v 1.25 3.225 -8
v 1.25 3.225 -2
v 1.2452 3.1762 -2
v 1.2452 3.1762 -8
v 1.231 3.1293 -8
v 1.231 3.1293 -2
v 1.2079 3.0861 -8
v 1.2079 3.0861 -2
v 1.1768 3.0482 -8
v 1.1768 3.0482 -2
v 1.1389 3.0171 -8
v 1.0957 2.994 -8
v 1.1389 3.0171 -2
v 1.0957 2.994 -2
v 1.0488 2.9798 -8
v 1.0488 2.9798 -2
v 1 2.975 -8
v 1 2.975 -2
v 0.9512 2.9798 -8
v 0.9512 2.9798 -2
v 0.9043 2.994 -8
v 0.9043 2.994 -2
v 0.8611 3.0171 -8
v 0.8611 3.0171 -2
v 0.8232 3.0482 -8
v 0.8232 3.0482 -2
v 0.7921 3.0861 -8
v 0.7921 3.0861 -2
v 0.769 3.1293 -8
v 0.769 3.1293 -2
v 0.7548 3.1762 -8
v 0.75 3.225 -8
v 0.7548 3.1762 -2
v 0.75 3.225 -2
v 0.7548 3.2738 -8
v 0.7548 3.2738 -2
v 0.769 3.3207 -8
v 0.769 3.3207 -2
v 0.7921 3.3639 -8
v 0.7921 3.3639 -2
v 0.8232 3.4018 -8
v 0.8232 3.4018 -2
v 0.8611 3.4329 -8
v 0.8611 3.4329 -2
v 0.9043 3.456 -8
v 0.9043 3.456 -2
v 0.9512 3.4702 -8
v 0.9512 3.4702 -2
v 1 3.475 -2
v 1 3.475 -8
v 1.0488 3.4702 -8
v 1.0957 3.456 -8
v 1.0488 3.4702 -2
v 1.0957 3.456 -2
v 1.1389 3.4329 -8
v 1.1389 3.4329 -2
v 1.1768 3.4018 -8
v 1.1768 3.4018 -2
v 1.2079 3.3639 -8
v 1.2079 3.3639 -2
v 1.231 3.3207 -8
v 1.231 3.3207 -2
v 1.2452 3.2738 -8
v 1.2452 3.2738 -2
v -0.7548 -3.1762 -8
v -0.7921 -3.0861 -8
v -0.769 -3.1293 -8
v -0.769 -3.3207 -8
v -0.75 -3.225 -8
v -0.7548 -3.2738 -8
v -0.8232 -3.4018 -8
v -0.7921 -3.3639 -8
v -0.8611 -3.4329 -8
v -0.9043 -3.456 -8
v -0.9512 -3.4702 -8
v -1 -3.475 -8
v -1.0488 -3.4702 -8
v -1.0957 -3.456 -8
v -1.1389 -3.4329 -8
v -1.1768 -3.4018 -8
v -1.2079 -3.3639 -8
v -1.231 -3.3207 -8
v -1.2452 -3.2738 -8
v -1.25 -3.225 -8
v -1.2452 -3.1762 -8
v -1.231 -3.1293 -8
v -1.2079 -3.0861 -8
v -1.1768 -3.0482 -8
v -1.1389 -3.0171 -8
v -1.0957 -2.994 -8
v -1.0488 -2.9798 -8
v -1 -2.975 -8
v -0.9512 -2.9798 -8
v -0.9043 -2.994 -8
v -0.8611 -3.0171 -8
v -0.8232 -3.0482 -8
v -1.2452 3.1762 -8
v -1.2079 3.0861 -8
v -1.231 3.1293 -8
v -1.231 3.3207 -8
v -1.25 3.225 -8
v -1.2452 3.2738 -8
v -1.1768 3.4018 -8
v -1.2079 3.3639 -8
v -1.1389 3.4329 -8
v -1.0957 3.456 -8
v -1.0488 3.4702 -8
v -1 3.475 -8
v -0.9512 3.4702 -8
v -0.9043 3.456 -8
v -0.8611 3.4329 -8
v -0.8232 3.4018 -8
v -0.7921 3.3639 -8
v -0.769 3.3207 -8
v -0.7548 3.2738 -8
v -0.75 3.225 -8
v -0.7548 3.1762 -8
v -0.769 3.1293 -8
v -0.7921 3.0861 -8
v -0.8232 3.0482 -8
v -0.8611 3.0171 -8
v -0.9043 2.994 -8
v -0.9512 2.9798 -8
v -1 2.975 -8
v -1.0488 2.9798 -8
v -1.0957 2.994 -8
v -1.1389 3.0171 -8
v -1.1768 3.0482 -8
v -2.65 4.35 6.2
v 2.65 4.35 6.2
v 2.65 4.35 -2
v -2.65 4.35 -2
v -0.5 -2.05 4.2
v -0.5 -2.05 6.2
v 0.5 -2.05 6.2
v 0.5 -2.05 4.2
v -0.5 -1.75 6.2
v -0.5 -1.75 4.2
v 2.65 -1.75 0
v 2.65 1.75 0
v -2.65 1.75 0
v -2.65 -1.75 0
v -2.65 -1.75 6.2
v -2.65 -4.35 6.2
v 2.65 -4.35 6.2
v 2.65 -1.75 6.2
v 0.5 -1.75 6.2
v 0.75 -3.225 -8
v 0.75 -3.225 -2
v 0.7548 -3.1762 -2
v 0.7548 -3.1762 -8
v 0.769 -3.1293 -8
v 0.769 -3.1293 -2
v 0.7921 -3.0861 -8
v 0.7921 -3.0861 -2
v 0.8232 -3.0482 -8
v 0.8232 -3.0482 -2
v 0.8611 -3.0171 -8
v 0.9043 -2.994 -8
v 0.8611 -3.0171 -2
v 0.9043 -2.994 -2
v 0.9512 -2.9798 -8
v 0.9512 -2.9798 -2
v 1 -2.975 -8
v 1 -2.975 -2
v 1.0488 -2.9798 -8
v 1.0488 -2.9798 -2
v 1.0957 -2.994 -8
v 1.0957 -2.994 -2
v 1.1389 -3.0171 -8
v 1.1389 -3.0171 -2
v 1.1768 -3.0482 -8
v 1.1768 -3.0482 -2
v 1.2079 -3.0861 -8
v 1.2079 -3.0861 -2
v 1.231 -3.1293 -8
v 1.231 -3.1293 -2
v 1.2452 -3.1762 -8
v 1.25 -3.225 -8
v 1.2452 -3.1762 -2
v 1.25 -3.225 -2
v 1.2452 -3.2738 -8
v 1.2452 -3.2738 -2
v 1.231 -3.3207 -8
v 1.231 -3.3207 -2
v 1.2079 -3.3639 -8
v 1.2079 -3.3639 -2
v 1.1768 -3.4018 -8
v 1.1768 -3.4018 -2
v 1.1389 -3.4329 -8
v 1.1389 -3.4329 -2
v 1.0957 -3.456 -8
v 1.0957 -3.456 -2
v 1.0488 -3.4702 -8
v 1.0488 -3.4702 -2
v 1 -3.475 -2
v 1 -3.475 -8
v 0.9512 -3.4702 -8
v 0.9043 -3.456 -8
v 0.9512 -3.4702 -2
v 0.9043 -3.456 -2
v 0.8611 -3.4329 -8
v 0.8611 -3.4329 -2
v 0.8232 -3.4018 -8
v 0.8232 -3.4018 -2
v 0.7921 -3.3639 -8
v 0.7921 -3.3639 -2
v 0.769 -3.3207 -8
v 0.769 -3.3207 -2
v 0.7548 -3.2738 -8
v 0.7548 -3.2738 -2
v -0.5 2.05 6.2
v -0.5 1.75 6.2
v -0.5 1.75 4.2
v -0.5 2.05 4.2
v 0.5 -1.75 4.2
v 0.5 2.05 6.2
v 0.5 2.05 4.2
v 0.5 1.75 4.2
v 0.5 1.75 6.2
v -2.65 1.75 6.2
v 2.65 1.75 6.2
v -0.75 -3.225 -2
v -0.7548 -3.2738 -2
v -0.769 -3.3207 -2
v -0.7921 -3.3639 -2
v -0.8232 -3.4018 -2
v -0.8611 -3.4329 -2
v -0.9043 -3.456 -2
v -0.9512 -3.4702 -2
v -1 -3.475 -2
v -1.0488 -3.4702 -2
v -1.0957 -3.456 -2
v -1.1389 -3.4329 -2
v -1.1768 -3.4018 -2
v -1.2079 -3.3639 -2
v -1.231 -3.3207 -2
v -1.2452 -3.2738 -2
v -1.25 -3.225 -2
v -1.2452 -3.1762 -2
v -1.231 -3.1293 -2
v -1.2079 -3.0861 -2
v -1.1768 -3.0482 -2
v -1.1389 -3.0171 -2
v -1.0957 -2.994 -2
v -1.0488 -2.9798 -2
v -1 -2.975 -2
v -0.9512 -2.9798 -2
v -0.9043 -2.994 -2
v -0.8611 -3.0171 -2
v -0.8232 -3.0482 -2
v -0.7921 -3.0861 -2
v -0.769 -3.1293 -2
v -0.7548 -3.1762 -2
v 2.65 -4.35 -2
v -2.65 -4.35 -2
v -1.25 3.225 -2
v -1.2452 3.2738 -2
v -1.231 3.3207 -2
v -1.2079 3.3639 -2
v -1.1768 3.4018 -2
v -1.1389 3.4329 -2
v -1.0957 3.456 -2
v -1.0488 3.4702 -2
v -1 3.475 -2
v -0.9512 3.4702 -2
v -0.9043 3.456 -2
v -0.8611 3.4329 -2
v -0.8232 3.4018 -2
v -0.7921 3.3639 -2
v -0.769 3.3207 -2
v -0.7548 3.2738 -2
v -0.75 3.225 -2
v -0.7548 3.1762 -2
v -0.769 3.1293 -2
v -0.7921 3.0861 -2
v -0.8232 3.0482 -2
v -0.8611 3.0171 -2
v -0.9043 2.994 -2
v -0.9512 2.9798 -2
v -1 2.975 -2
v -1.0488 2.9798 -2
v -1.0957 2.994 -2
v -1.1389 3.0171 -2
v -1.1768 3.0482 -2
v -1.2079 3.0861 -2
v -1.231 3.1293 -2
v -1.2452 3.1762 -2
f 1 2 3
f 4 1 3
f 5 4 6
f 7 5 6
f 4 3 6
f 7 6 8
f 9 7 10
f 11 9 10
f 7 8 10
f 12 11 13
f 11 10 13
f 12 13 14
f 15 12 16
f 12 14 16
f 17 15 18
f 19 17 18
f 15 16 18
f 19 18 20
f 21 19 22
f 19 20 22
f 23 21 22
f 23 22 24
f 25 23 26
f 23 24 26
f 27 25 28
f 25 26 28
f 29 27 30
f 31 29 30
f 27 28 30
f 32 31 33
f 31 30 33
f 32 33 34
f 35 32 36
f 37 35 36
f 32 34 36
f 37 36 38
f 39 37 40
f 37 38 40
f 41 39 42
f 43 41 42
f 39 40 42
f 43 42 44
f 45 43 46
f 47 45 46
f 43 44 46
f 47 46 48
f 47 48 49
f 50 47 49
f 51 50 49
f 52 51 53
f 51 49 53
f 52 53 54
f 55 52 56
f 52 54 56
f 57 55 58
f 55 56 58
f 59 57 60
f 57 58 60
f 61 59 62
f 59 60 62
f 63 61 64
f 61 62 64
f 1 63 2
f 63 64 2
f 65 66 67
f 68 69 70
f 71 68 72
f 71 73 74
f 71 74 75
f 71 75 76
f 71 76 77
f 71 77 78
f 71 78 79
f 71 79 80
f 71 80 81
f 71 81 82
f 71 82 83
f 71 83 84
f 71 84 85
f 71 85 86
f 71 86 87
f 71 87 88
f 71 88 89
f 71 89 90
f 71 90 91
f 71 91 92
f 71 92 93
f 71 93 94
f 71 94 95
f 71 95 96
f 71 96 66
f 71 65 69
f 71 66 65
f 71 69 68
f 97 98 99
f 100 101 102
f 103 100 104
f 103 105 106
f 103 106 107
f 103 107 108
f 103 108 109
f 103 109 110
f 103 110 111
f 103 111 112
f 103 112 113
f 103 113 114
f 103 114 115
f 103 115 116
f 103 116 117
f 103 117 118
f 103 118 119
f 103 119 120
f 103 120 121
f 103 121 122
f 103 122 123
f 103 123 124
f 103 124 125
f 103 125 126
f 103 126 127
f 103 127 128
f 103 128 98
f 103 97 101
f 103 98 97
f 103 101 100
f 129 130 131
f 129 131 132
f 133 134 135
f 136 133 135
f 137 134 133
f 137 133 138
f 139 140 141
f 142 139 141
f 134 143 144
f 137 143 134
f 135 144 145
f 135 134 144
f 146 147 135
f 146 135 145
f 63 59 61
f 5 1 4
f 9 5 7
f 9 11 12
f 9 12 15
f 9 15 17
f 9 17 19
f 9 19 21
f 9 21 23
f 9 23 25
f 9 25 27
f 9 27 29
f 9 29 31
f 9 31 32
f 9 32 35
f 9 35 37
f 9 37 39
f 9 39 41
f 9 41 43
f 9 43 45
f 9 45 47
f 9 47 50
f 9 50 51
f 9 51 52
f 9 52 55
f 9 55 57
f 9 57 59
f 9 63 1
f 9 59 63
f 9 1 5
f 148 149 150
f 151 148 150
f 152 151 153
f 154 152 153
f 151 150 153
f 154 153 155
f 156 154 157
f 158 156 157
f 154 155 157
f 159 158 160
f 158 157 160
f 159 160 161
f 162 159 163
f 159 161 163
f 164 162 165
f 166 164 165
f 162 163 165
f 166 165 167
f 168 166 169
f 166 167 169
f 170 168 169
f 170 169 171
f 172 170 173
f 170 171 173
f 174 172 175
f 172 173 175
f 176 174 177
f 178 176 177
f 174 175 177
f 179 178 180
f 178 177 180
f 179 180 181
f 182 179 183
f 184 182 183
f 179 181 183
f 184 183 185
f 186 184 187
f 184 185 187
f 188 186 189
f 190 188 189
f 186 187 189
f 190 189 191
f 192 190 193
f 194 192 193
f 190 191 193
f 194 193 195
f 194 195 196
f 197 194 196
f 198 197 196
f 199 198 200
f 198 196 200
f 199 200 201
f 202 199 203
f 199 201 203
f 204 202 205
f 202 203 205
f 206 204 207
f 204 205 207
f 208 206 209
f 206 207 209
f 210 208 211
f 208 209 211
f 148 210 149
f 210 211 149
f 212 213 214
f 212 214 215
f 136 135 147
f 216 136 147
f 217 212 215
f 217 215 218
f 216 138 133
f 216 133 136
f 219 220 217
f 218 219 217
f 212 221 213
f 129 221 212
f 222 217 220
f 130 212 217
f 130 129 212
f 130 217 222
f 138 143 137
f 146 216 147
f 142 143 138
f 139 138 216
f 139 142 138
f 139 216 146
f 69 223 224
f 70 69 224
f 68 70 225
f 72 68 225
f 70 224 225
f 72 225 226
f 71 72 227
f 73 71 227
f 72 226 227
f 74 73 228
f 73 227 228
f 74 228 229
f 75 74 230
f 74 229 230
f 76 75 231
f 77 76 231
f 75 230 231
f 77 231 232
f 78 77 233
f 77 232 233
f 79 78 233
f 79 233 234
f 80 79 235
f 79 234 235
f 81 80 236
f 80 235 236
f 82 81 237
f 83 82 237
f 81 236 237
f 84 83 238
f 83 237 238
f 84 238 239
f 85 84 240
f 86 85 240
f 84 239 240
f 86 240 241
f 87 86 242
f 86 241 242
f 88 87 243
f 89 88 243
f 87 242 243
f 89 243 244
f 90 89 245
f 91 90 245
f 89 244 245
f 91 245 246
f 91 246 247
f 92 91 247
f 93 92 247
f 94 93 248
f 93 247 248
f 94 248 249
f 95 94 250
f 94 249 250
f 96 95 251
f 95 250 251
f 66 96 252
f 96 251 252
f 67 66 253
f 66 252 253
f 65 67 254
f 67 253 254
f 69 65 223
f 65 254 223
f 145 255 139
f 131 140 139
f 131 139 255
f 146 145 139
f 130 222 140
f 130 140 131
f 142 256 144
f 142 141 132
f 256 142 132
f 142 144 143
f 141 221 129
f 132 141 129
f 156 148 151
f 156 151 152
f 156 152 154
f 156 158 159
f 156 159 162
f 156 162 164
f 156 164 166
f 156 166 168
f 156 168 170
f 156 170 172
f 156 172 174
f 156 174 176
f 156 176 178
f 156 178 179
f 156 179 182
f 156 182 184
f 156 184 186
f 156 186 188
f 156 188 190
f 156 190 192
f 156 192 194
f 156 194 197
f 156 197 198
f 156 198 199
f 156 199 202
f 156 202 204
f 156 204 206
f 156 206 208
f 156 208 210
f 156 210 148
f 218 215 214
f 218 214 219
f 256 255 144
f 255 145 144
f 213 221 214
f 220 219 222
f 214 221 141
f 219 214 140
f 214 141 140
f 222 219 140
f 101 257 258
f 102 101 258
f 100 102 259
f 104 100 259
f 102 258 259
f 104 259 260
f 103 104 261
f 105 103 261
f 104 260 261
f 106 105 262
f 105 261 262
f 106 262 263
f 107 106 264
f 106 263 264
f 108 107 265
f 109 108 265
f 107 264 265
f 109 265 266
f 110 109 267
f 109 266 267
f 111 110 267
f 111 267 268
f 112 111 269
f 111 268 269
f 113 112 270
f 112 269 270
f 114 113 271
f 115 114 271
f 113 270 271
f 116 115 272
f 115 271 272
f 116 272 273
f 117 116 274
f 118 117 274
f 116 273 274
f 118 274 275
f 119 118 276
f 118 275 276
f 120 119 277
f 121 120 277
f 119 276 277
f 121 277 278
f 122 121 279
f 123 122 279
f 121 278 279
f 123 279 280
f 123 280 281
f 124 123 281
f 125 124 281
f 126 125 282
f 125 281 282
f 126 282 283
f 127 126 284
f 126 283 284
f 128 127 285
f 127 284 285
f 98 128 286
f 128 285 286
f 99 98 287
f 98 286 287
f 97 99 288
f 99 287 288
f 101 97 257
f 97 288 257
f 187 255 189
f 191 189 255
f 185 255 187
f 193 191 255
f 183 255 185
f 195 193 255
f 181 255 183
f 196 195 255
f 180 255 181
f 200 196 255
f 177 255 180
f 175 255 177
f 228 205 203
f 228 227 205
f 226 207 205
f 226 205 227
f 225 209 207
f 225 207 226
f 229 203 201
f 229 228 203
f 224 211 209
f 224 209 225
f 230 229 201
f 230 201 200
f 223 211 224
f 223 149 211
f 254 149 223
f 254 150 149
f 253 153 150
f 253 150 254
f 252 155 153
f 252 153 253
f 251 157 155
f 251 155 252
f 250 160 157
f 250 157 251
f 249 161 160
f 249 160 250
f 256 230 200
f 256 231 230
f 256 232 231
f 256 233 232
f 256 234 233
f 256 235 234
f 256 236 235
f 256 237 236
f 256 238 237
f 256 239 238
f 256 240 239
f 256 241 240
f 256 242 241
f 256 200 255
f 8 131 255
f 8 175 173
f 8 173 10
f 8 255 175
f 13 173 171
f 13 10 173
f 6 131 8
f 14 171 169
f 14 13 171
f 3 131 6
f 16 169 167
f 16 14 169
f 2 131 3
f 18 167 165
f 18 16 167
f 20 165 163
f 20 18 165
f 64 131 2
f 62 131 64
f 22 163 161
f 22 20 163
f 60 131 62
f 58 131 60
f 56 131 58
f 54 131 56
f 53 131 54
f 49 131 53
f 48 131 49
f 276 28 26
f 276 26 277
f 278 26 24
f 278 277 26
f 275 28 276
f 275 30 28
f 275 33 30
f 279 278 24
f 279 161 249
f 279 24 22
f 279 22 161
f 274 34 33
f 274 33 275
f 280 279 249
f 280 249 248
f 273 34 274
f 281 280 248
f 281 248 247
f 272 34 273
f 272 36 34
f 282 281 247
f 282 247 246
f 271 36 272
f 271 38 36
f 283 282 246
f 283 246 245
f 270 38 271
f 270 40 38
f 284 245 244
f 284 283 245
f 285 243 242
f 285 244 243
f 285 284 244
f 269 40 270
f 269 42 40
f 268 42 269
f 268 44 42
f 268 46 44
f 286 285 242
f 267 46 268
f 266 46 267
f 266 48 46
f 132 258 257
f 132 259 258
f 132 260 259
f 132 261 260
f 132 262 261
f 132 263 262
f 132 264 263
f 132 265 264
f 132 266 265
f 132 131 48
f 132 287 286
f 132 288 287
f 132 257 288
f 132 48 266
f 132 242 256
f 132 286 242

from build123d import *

# Parameters (mm, degrees)
SKETCH1_W             = 5.3
SKETCH1_H             = 2.6
BOSS_EXTRUDE1_DEPTH   = 6.2
BOSS_EXTRUDE1_2_DEPTH = 6.2
SKETCH2_W             = 5.3
SKETCH2_H             = 8.7
BOSS_EXTRUDE2_DEPTH   = 2
SKETCH3_W             = 1
SKETCH3_H             = 4.1
CUT_EXTRUDE1_DEPTH    = 2
SKETCH4_R             = 0.25
BOSS_EXTRUDE3_DEPTH   = 6


with BuildPart() as part:
    # Sketch1 → Boss-Extrude1 (new body)
    with BuildSketch(Plane.XY):
        with Locations((0, 3.05)):
            Rectangle(SKETCH1_W, SKETCH1_H)
    extrude(amount=BOSS_EXTRUDE1_DEPTH)



with BuildPart() as body_2:
    # Sketch1 → Boss-Extrude1 2 (new body)
    with BuildSketch(Plane.XY):
        with Locations((0, -3.05)):
            Rectangle(SKETCH1_W, SKETCH1_H)
    extrude(amount=BOSS_EXTRUDE1_2_DEPTH)


with BuildPart() as part_1:
    add(part.part)

    add(body_2.part)  # Boss-Extrude2 merges body 2
    # Sketch2 → Boss-Extrude2 (add)
    with BuildSketch(Plane(origin=(0, 0, 0), x_dir=(-1, 0, 0), z_dir=(0, 0, -1))):
        Rectangle(SKETCH2_W, SKETCH2_H)
    extrude(amount=BOSS_EXTRUDE2_DEPTH)

    # Sketch3 → Cut-Extrude1 (cut)
    with BuildSketch(Plane.XY.offset(6.2)):
        Rectangle(SKETCH3_W, SKETCH3_H)
    extrude(amount=-CUT_EXTRUDE1_DEPTH, mode=Mode.SUBTRACT)

    # Sketch4 → Boss-Extrude3 (add)
    with BuildSketch(Plane(origin=(0, 0, -2), x_dir=(-1, 0, 0), z_dir=(0, 0, -1))):
        with Locations((-1, -3.225)):
            Circle(SKETCH4_R)
        with Locations(Location((1, -3.225, 0), (0, 0, 180))):
            Circle(SKETCH4_R)
        with Locations((1, 3.225)):
            Circle(SKETCH4_R)
        with Locations(Location((-1, 3.225, 0), (0, 0, 180))):
            Circle(SKETCH4_R)
    extrude(amount=BOSS_EXTRUDE3_DEPTH)


solid = part_1.part
